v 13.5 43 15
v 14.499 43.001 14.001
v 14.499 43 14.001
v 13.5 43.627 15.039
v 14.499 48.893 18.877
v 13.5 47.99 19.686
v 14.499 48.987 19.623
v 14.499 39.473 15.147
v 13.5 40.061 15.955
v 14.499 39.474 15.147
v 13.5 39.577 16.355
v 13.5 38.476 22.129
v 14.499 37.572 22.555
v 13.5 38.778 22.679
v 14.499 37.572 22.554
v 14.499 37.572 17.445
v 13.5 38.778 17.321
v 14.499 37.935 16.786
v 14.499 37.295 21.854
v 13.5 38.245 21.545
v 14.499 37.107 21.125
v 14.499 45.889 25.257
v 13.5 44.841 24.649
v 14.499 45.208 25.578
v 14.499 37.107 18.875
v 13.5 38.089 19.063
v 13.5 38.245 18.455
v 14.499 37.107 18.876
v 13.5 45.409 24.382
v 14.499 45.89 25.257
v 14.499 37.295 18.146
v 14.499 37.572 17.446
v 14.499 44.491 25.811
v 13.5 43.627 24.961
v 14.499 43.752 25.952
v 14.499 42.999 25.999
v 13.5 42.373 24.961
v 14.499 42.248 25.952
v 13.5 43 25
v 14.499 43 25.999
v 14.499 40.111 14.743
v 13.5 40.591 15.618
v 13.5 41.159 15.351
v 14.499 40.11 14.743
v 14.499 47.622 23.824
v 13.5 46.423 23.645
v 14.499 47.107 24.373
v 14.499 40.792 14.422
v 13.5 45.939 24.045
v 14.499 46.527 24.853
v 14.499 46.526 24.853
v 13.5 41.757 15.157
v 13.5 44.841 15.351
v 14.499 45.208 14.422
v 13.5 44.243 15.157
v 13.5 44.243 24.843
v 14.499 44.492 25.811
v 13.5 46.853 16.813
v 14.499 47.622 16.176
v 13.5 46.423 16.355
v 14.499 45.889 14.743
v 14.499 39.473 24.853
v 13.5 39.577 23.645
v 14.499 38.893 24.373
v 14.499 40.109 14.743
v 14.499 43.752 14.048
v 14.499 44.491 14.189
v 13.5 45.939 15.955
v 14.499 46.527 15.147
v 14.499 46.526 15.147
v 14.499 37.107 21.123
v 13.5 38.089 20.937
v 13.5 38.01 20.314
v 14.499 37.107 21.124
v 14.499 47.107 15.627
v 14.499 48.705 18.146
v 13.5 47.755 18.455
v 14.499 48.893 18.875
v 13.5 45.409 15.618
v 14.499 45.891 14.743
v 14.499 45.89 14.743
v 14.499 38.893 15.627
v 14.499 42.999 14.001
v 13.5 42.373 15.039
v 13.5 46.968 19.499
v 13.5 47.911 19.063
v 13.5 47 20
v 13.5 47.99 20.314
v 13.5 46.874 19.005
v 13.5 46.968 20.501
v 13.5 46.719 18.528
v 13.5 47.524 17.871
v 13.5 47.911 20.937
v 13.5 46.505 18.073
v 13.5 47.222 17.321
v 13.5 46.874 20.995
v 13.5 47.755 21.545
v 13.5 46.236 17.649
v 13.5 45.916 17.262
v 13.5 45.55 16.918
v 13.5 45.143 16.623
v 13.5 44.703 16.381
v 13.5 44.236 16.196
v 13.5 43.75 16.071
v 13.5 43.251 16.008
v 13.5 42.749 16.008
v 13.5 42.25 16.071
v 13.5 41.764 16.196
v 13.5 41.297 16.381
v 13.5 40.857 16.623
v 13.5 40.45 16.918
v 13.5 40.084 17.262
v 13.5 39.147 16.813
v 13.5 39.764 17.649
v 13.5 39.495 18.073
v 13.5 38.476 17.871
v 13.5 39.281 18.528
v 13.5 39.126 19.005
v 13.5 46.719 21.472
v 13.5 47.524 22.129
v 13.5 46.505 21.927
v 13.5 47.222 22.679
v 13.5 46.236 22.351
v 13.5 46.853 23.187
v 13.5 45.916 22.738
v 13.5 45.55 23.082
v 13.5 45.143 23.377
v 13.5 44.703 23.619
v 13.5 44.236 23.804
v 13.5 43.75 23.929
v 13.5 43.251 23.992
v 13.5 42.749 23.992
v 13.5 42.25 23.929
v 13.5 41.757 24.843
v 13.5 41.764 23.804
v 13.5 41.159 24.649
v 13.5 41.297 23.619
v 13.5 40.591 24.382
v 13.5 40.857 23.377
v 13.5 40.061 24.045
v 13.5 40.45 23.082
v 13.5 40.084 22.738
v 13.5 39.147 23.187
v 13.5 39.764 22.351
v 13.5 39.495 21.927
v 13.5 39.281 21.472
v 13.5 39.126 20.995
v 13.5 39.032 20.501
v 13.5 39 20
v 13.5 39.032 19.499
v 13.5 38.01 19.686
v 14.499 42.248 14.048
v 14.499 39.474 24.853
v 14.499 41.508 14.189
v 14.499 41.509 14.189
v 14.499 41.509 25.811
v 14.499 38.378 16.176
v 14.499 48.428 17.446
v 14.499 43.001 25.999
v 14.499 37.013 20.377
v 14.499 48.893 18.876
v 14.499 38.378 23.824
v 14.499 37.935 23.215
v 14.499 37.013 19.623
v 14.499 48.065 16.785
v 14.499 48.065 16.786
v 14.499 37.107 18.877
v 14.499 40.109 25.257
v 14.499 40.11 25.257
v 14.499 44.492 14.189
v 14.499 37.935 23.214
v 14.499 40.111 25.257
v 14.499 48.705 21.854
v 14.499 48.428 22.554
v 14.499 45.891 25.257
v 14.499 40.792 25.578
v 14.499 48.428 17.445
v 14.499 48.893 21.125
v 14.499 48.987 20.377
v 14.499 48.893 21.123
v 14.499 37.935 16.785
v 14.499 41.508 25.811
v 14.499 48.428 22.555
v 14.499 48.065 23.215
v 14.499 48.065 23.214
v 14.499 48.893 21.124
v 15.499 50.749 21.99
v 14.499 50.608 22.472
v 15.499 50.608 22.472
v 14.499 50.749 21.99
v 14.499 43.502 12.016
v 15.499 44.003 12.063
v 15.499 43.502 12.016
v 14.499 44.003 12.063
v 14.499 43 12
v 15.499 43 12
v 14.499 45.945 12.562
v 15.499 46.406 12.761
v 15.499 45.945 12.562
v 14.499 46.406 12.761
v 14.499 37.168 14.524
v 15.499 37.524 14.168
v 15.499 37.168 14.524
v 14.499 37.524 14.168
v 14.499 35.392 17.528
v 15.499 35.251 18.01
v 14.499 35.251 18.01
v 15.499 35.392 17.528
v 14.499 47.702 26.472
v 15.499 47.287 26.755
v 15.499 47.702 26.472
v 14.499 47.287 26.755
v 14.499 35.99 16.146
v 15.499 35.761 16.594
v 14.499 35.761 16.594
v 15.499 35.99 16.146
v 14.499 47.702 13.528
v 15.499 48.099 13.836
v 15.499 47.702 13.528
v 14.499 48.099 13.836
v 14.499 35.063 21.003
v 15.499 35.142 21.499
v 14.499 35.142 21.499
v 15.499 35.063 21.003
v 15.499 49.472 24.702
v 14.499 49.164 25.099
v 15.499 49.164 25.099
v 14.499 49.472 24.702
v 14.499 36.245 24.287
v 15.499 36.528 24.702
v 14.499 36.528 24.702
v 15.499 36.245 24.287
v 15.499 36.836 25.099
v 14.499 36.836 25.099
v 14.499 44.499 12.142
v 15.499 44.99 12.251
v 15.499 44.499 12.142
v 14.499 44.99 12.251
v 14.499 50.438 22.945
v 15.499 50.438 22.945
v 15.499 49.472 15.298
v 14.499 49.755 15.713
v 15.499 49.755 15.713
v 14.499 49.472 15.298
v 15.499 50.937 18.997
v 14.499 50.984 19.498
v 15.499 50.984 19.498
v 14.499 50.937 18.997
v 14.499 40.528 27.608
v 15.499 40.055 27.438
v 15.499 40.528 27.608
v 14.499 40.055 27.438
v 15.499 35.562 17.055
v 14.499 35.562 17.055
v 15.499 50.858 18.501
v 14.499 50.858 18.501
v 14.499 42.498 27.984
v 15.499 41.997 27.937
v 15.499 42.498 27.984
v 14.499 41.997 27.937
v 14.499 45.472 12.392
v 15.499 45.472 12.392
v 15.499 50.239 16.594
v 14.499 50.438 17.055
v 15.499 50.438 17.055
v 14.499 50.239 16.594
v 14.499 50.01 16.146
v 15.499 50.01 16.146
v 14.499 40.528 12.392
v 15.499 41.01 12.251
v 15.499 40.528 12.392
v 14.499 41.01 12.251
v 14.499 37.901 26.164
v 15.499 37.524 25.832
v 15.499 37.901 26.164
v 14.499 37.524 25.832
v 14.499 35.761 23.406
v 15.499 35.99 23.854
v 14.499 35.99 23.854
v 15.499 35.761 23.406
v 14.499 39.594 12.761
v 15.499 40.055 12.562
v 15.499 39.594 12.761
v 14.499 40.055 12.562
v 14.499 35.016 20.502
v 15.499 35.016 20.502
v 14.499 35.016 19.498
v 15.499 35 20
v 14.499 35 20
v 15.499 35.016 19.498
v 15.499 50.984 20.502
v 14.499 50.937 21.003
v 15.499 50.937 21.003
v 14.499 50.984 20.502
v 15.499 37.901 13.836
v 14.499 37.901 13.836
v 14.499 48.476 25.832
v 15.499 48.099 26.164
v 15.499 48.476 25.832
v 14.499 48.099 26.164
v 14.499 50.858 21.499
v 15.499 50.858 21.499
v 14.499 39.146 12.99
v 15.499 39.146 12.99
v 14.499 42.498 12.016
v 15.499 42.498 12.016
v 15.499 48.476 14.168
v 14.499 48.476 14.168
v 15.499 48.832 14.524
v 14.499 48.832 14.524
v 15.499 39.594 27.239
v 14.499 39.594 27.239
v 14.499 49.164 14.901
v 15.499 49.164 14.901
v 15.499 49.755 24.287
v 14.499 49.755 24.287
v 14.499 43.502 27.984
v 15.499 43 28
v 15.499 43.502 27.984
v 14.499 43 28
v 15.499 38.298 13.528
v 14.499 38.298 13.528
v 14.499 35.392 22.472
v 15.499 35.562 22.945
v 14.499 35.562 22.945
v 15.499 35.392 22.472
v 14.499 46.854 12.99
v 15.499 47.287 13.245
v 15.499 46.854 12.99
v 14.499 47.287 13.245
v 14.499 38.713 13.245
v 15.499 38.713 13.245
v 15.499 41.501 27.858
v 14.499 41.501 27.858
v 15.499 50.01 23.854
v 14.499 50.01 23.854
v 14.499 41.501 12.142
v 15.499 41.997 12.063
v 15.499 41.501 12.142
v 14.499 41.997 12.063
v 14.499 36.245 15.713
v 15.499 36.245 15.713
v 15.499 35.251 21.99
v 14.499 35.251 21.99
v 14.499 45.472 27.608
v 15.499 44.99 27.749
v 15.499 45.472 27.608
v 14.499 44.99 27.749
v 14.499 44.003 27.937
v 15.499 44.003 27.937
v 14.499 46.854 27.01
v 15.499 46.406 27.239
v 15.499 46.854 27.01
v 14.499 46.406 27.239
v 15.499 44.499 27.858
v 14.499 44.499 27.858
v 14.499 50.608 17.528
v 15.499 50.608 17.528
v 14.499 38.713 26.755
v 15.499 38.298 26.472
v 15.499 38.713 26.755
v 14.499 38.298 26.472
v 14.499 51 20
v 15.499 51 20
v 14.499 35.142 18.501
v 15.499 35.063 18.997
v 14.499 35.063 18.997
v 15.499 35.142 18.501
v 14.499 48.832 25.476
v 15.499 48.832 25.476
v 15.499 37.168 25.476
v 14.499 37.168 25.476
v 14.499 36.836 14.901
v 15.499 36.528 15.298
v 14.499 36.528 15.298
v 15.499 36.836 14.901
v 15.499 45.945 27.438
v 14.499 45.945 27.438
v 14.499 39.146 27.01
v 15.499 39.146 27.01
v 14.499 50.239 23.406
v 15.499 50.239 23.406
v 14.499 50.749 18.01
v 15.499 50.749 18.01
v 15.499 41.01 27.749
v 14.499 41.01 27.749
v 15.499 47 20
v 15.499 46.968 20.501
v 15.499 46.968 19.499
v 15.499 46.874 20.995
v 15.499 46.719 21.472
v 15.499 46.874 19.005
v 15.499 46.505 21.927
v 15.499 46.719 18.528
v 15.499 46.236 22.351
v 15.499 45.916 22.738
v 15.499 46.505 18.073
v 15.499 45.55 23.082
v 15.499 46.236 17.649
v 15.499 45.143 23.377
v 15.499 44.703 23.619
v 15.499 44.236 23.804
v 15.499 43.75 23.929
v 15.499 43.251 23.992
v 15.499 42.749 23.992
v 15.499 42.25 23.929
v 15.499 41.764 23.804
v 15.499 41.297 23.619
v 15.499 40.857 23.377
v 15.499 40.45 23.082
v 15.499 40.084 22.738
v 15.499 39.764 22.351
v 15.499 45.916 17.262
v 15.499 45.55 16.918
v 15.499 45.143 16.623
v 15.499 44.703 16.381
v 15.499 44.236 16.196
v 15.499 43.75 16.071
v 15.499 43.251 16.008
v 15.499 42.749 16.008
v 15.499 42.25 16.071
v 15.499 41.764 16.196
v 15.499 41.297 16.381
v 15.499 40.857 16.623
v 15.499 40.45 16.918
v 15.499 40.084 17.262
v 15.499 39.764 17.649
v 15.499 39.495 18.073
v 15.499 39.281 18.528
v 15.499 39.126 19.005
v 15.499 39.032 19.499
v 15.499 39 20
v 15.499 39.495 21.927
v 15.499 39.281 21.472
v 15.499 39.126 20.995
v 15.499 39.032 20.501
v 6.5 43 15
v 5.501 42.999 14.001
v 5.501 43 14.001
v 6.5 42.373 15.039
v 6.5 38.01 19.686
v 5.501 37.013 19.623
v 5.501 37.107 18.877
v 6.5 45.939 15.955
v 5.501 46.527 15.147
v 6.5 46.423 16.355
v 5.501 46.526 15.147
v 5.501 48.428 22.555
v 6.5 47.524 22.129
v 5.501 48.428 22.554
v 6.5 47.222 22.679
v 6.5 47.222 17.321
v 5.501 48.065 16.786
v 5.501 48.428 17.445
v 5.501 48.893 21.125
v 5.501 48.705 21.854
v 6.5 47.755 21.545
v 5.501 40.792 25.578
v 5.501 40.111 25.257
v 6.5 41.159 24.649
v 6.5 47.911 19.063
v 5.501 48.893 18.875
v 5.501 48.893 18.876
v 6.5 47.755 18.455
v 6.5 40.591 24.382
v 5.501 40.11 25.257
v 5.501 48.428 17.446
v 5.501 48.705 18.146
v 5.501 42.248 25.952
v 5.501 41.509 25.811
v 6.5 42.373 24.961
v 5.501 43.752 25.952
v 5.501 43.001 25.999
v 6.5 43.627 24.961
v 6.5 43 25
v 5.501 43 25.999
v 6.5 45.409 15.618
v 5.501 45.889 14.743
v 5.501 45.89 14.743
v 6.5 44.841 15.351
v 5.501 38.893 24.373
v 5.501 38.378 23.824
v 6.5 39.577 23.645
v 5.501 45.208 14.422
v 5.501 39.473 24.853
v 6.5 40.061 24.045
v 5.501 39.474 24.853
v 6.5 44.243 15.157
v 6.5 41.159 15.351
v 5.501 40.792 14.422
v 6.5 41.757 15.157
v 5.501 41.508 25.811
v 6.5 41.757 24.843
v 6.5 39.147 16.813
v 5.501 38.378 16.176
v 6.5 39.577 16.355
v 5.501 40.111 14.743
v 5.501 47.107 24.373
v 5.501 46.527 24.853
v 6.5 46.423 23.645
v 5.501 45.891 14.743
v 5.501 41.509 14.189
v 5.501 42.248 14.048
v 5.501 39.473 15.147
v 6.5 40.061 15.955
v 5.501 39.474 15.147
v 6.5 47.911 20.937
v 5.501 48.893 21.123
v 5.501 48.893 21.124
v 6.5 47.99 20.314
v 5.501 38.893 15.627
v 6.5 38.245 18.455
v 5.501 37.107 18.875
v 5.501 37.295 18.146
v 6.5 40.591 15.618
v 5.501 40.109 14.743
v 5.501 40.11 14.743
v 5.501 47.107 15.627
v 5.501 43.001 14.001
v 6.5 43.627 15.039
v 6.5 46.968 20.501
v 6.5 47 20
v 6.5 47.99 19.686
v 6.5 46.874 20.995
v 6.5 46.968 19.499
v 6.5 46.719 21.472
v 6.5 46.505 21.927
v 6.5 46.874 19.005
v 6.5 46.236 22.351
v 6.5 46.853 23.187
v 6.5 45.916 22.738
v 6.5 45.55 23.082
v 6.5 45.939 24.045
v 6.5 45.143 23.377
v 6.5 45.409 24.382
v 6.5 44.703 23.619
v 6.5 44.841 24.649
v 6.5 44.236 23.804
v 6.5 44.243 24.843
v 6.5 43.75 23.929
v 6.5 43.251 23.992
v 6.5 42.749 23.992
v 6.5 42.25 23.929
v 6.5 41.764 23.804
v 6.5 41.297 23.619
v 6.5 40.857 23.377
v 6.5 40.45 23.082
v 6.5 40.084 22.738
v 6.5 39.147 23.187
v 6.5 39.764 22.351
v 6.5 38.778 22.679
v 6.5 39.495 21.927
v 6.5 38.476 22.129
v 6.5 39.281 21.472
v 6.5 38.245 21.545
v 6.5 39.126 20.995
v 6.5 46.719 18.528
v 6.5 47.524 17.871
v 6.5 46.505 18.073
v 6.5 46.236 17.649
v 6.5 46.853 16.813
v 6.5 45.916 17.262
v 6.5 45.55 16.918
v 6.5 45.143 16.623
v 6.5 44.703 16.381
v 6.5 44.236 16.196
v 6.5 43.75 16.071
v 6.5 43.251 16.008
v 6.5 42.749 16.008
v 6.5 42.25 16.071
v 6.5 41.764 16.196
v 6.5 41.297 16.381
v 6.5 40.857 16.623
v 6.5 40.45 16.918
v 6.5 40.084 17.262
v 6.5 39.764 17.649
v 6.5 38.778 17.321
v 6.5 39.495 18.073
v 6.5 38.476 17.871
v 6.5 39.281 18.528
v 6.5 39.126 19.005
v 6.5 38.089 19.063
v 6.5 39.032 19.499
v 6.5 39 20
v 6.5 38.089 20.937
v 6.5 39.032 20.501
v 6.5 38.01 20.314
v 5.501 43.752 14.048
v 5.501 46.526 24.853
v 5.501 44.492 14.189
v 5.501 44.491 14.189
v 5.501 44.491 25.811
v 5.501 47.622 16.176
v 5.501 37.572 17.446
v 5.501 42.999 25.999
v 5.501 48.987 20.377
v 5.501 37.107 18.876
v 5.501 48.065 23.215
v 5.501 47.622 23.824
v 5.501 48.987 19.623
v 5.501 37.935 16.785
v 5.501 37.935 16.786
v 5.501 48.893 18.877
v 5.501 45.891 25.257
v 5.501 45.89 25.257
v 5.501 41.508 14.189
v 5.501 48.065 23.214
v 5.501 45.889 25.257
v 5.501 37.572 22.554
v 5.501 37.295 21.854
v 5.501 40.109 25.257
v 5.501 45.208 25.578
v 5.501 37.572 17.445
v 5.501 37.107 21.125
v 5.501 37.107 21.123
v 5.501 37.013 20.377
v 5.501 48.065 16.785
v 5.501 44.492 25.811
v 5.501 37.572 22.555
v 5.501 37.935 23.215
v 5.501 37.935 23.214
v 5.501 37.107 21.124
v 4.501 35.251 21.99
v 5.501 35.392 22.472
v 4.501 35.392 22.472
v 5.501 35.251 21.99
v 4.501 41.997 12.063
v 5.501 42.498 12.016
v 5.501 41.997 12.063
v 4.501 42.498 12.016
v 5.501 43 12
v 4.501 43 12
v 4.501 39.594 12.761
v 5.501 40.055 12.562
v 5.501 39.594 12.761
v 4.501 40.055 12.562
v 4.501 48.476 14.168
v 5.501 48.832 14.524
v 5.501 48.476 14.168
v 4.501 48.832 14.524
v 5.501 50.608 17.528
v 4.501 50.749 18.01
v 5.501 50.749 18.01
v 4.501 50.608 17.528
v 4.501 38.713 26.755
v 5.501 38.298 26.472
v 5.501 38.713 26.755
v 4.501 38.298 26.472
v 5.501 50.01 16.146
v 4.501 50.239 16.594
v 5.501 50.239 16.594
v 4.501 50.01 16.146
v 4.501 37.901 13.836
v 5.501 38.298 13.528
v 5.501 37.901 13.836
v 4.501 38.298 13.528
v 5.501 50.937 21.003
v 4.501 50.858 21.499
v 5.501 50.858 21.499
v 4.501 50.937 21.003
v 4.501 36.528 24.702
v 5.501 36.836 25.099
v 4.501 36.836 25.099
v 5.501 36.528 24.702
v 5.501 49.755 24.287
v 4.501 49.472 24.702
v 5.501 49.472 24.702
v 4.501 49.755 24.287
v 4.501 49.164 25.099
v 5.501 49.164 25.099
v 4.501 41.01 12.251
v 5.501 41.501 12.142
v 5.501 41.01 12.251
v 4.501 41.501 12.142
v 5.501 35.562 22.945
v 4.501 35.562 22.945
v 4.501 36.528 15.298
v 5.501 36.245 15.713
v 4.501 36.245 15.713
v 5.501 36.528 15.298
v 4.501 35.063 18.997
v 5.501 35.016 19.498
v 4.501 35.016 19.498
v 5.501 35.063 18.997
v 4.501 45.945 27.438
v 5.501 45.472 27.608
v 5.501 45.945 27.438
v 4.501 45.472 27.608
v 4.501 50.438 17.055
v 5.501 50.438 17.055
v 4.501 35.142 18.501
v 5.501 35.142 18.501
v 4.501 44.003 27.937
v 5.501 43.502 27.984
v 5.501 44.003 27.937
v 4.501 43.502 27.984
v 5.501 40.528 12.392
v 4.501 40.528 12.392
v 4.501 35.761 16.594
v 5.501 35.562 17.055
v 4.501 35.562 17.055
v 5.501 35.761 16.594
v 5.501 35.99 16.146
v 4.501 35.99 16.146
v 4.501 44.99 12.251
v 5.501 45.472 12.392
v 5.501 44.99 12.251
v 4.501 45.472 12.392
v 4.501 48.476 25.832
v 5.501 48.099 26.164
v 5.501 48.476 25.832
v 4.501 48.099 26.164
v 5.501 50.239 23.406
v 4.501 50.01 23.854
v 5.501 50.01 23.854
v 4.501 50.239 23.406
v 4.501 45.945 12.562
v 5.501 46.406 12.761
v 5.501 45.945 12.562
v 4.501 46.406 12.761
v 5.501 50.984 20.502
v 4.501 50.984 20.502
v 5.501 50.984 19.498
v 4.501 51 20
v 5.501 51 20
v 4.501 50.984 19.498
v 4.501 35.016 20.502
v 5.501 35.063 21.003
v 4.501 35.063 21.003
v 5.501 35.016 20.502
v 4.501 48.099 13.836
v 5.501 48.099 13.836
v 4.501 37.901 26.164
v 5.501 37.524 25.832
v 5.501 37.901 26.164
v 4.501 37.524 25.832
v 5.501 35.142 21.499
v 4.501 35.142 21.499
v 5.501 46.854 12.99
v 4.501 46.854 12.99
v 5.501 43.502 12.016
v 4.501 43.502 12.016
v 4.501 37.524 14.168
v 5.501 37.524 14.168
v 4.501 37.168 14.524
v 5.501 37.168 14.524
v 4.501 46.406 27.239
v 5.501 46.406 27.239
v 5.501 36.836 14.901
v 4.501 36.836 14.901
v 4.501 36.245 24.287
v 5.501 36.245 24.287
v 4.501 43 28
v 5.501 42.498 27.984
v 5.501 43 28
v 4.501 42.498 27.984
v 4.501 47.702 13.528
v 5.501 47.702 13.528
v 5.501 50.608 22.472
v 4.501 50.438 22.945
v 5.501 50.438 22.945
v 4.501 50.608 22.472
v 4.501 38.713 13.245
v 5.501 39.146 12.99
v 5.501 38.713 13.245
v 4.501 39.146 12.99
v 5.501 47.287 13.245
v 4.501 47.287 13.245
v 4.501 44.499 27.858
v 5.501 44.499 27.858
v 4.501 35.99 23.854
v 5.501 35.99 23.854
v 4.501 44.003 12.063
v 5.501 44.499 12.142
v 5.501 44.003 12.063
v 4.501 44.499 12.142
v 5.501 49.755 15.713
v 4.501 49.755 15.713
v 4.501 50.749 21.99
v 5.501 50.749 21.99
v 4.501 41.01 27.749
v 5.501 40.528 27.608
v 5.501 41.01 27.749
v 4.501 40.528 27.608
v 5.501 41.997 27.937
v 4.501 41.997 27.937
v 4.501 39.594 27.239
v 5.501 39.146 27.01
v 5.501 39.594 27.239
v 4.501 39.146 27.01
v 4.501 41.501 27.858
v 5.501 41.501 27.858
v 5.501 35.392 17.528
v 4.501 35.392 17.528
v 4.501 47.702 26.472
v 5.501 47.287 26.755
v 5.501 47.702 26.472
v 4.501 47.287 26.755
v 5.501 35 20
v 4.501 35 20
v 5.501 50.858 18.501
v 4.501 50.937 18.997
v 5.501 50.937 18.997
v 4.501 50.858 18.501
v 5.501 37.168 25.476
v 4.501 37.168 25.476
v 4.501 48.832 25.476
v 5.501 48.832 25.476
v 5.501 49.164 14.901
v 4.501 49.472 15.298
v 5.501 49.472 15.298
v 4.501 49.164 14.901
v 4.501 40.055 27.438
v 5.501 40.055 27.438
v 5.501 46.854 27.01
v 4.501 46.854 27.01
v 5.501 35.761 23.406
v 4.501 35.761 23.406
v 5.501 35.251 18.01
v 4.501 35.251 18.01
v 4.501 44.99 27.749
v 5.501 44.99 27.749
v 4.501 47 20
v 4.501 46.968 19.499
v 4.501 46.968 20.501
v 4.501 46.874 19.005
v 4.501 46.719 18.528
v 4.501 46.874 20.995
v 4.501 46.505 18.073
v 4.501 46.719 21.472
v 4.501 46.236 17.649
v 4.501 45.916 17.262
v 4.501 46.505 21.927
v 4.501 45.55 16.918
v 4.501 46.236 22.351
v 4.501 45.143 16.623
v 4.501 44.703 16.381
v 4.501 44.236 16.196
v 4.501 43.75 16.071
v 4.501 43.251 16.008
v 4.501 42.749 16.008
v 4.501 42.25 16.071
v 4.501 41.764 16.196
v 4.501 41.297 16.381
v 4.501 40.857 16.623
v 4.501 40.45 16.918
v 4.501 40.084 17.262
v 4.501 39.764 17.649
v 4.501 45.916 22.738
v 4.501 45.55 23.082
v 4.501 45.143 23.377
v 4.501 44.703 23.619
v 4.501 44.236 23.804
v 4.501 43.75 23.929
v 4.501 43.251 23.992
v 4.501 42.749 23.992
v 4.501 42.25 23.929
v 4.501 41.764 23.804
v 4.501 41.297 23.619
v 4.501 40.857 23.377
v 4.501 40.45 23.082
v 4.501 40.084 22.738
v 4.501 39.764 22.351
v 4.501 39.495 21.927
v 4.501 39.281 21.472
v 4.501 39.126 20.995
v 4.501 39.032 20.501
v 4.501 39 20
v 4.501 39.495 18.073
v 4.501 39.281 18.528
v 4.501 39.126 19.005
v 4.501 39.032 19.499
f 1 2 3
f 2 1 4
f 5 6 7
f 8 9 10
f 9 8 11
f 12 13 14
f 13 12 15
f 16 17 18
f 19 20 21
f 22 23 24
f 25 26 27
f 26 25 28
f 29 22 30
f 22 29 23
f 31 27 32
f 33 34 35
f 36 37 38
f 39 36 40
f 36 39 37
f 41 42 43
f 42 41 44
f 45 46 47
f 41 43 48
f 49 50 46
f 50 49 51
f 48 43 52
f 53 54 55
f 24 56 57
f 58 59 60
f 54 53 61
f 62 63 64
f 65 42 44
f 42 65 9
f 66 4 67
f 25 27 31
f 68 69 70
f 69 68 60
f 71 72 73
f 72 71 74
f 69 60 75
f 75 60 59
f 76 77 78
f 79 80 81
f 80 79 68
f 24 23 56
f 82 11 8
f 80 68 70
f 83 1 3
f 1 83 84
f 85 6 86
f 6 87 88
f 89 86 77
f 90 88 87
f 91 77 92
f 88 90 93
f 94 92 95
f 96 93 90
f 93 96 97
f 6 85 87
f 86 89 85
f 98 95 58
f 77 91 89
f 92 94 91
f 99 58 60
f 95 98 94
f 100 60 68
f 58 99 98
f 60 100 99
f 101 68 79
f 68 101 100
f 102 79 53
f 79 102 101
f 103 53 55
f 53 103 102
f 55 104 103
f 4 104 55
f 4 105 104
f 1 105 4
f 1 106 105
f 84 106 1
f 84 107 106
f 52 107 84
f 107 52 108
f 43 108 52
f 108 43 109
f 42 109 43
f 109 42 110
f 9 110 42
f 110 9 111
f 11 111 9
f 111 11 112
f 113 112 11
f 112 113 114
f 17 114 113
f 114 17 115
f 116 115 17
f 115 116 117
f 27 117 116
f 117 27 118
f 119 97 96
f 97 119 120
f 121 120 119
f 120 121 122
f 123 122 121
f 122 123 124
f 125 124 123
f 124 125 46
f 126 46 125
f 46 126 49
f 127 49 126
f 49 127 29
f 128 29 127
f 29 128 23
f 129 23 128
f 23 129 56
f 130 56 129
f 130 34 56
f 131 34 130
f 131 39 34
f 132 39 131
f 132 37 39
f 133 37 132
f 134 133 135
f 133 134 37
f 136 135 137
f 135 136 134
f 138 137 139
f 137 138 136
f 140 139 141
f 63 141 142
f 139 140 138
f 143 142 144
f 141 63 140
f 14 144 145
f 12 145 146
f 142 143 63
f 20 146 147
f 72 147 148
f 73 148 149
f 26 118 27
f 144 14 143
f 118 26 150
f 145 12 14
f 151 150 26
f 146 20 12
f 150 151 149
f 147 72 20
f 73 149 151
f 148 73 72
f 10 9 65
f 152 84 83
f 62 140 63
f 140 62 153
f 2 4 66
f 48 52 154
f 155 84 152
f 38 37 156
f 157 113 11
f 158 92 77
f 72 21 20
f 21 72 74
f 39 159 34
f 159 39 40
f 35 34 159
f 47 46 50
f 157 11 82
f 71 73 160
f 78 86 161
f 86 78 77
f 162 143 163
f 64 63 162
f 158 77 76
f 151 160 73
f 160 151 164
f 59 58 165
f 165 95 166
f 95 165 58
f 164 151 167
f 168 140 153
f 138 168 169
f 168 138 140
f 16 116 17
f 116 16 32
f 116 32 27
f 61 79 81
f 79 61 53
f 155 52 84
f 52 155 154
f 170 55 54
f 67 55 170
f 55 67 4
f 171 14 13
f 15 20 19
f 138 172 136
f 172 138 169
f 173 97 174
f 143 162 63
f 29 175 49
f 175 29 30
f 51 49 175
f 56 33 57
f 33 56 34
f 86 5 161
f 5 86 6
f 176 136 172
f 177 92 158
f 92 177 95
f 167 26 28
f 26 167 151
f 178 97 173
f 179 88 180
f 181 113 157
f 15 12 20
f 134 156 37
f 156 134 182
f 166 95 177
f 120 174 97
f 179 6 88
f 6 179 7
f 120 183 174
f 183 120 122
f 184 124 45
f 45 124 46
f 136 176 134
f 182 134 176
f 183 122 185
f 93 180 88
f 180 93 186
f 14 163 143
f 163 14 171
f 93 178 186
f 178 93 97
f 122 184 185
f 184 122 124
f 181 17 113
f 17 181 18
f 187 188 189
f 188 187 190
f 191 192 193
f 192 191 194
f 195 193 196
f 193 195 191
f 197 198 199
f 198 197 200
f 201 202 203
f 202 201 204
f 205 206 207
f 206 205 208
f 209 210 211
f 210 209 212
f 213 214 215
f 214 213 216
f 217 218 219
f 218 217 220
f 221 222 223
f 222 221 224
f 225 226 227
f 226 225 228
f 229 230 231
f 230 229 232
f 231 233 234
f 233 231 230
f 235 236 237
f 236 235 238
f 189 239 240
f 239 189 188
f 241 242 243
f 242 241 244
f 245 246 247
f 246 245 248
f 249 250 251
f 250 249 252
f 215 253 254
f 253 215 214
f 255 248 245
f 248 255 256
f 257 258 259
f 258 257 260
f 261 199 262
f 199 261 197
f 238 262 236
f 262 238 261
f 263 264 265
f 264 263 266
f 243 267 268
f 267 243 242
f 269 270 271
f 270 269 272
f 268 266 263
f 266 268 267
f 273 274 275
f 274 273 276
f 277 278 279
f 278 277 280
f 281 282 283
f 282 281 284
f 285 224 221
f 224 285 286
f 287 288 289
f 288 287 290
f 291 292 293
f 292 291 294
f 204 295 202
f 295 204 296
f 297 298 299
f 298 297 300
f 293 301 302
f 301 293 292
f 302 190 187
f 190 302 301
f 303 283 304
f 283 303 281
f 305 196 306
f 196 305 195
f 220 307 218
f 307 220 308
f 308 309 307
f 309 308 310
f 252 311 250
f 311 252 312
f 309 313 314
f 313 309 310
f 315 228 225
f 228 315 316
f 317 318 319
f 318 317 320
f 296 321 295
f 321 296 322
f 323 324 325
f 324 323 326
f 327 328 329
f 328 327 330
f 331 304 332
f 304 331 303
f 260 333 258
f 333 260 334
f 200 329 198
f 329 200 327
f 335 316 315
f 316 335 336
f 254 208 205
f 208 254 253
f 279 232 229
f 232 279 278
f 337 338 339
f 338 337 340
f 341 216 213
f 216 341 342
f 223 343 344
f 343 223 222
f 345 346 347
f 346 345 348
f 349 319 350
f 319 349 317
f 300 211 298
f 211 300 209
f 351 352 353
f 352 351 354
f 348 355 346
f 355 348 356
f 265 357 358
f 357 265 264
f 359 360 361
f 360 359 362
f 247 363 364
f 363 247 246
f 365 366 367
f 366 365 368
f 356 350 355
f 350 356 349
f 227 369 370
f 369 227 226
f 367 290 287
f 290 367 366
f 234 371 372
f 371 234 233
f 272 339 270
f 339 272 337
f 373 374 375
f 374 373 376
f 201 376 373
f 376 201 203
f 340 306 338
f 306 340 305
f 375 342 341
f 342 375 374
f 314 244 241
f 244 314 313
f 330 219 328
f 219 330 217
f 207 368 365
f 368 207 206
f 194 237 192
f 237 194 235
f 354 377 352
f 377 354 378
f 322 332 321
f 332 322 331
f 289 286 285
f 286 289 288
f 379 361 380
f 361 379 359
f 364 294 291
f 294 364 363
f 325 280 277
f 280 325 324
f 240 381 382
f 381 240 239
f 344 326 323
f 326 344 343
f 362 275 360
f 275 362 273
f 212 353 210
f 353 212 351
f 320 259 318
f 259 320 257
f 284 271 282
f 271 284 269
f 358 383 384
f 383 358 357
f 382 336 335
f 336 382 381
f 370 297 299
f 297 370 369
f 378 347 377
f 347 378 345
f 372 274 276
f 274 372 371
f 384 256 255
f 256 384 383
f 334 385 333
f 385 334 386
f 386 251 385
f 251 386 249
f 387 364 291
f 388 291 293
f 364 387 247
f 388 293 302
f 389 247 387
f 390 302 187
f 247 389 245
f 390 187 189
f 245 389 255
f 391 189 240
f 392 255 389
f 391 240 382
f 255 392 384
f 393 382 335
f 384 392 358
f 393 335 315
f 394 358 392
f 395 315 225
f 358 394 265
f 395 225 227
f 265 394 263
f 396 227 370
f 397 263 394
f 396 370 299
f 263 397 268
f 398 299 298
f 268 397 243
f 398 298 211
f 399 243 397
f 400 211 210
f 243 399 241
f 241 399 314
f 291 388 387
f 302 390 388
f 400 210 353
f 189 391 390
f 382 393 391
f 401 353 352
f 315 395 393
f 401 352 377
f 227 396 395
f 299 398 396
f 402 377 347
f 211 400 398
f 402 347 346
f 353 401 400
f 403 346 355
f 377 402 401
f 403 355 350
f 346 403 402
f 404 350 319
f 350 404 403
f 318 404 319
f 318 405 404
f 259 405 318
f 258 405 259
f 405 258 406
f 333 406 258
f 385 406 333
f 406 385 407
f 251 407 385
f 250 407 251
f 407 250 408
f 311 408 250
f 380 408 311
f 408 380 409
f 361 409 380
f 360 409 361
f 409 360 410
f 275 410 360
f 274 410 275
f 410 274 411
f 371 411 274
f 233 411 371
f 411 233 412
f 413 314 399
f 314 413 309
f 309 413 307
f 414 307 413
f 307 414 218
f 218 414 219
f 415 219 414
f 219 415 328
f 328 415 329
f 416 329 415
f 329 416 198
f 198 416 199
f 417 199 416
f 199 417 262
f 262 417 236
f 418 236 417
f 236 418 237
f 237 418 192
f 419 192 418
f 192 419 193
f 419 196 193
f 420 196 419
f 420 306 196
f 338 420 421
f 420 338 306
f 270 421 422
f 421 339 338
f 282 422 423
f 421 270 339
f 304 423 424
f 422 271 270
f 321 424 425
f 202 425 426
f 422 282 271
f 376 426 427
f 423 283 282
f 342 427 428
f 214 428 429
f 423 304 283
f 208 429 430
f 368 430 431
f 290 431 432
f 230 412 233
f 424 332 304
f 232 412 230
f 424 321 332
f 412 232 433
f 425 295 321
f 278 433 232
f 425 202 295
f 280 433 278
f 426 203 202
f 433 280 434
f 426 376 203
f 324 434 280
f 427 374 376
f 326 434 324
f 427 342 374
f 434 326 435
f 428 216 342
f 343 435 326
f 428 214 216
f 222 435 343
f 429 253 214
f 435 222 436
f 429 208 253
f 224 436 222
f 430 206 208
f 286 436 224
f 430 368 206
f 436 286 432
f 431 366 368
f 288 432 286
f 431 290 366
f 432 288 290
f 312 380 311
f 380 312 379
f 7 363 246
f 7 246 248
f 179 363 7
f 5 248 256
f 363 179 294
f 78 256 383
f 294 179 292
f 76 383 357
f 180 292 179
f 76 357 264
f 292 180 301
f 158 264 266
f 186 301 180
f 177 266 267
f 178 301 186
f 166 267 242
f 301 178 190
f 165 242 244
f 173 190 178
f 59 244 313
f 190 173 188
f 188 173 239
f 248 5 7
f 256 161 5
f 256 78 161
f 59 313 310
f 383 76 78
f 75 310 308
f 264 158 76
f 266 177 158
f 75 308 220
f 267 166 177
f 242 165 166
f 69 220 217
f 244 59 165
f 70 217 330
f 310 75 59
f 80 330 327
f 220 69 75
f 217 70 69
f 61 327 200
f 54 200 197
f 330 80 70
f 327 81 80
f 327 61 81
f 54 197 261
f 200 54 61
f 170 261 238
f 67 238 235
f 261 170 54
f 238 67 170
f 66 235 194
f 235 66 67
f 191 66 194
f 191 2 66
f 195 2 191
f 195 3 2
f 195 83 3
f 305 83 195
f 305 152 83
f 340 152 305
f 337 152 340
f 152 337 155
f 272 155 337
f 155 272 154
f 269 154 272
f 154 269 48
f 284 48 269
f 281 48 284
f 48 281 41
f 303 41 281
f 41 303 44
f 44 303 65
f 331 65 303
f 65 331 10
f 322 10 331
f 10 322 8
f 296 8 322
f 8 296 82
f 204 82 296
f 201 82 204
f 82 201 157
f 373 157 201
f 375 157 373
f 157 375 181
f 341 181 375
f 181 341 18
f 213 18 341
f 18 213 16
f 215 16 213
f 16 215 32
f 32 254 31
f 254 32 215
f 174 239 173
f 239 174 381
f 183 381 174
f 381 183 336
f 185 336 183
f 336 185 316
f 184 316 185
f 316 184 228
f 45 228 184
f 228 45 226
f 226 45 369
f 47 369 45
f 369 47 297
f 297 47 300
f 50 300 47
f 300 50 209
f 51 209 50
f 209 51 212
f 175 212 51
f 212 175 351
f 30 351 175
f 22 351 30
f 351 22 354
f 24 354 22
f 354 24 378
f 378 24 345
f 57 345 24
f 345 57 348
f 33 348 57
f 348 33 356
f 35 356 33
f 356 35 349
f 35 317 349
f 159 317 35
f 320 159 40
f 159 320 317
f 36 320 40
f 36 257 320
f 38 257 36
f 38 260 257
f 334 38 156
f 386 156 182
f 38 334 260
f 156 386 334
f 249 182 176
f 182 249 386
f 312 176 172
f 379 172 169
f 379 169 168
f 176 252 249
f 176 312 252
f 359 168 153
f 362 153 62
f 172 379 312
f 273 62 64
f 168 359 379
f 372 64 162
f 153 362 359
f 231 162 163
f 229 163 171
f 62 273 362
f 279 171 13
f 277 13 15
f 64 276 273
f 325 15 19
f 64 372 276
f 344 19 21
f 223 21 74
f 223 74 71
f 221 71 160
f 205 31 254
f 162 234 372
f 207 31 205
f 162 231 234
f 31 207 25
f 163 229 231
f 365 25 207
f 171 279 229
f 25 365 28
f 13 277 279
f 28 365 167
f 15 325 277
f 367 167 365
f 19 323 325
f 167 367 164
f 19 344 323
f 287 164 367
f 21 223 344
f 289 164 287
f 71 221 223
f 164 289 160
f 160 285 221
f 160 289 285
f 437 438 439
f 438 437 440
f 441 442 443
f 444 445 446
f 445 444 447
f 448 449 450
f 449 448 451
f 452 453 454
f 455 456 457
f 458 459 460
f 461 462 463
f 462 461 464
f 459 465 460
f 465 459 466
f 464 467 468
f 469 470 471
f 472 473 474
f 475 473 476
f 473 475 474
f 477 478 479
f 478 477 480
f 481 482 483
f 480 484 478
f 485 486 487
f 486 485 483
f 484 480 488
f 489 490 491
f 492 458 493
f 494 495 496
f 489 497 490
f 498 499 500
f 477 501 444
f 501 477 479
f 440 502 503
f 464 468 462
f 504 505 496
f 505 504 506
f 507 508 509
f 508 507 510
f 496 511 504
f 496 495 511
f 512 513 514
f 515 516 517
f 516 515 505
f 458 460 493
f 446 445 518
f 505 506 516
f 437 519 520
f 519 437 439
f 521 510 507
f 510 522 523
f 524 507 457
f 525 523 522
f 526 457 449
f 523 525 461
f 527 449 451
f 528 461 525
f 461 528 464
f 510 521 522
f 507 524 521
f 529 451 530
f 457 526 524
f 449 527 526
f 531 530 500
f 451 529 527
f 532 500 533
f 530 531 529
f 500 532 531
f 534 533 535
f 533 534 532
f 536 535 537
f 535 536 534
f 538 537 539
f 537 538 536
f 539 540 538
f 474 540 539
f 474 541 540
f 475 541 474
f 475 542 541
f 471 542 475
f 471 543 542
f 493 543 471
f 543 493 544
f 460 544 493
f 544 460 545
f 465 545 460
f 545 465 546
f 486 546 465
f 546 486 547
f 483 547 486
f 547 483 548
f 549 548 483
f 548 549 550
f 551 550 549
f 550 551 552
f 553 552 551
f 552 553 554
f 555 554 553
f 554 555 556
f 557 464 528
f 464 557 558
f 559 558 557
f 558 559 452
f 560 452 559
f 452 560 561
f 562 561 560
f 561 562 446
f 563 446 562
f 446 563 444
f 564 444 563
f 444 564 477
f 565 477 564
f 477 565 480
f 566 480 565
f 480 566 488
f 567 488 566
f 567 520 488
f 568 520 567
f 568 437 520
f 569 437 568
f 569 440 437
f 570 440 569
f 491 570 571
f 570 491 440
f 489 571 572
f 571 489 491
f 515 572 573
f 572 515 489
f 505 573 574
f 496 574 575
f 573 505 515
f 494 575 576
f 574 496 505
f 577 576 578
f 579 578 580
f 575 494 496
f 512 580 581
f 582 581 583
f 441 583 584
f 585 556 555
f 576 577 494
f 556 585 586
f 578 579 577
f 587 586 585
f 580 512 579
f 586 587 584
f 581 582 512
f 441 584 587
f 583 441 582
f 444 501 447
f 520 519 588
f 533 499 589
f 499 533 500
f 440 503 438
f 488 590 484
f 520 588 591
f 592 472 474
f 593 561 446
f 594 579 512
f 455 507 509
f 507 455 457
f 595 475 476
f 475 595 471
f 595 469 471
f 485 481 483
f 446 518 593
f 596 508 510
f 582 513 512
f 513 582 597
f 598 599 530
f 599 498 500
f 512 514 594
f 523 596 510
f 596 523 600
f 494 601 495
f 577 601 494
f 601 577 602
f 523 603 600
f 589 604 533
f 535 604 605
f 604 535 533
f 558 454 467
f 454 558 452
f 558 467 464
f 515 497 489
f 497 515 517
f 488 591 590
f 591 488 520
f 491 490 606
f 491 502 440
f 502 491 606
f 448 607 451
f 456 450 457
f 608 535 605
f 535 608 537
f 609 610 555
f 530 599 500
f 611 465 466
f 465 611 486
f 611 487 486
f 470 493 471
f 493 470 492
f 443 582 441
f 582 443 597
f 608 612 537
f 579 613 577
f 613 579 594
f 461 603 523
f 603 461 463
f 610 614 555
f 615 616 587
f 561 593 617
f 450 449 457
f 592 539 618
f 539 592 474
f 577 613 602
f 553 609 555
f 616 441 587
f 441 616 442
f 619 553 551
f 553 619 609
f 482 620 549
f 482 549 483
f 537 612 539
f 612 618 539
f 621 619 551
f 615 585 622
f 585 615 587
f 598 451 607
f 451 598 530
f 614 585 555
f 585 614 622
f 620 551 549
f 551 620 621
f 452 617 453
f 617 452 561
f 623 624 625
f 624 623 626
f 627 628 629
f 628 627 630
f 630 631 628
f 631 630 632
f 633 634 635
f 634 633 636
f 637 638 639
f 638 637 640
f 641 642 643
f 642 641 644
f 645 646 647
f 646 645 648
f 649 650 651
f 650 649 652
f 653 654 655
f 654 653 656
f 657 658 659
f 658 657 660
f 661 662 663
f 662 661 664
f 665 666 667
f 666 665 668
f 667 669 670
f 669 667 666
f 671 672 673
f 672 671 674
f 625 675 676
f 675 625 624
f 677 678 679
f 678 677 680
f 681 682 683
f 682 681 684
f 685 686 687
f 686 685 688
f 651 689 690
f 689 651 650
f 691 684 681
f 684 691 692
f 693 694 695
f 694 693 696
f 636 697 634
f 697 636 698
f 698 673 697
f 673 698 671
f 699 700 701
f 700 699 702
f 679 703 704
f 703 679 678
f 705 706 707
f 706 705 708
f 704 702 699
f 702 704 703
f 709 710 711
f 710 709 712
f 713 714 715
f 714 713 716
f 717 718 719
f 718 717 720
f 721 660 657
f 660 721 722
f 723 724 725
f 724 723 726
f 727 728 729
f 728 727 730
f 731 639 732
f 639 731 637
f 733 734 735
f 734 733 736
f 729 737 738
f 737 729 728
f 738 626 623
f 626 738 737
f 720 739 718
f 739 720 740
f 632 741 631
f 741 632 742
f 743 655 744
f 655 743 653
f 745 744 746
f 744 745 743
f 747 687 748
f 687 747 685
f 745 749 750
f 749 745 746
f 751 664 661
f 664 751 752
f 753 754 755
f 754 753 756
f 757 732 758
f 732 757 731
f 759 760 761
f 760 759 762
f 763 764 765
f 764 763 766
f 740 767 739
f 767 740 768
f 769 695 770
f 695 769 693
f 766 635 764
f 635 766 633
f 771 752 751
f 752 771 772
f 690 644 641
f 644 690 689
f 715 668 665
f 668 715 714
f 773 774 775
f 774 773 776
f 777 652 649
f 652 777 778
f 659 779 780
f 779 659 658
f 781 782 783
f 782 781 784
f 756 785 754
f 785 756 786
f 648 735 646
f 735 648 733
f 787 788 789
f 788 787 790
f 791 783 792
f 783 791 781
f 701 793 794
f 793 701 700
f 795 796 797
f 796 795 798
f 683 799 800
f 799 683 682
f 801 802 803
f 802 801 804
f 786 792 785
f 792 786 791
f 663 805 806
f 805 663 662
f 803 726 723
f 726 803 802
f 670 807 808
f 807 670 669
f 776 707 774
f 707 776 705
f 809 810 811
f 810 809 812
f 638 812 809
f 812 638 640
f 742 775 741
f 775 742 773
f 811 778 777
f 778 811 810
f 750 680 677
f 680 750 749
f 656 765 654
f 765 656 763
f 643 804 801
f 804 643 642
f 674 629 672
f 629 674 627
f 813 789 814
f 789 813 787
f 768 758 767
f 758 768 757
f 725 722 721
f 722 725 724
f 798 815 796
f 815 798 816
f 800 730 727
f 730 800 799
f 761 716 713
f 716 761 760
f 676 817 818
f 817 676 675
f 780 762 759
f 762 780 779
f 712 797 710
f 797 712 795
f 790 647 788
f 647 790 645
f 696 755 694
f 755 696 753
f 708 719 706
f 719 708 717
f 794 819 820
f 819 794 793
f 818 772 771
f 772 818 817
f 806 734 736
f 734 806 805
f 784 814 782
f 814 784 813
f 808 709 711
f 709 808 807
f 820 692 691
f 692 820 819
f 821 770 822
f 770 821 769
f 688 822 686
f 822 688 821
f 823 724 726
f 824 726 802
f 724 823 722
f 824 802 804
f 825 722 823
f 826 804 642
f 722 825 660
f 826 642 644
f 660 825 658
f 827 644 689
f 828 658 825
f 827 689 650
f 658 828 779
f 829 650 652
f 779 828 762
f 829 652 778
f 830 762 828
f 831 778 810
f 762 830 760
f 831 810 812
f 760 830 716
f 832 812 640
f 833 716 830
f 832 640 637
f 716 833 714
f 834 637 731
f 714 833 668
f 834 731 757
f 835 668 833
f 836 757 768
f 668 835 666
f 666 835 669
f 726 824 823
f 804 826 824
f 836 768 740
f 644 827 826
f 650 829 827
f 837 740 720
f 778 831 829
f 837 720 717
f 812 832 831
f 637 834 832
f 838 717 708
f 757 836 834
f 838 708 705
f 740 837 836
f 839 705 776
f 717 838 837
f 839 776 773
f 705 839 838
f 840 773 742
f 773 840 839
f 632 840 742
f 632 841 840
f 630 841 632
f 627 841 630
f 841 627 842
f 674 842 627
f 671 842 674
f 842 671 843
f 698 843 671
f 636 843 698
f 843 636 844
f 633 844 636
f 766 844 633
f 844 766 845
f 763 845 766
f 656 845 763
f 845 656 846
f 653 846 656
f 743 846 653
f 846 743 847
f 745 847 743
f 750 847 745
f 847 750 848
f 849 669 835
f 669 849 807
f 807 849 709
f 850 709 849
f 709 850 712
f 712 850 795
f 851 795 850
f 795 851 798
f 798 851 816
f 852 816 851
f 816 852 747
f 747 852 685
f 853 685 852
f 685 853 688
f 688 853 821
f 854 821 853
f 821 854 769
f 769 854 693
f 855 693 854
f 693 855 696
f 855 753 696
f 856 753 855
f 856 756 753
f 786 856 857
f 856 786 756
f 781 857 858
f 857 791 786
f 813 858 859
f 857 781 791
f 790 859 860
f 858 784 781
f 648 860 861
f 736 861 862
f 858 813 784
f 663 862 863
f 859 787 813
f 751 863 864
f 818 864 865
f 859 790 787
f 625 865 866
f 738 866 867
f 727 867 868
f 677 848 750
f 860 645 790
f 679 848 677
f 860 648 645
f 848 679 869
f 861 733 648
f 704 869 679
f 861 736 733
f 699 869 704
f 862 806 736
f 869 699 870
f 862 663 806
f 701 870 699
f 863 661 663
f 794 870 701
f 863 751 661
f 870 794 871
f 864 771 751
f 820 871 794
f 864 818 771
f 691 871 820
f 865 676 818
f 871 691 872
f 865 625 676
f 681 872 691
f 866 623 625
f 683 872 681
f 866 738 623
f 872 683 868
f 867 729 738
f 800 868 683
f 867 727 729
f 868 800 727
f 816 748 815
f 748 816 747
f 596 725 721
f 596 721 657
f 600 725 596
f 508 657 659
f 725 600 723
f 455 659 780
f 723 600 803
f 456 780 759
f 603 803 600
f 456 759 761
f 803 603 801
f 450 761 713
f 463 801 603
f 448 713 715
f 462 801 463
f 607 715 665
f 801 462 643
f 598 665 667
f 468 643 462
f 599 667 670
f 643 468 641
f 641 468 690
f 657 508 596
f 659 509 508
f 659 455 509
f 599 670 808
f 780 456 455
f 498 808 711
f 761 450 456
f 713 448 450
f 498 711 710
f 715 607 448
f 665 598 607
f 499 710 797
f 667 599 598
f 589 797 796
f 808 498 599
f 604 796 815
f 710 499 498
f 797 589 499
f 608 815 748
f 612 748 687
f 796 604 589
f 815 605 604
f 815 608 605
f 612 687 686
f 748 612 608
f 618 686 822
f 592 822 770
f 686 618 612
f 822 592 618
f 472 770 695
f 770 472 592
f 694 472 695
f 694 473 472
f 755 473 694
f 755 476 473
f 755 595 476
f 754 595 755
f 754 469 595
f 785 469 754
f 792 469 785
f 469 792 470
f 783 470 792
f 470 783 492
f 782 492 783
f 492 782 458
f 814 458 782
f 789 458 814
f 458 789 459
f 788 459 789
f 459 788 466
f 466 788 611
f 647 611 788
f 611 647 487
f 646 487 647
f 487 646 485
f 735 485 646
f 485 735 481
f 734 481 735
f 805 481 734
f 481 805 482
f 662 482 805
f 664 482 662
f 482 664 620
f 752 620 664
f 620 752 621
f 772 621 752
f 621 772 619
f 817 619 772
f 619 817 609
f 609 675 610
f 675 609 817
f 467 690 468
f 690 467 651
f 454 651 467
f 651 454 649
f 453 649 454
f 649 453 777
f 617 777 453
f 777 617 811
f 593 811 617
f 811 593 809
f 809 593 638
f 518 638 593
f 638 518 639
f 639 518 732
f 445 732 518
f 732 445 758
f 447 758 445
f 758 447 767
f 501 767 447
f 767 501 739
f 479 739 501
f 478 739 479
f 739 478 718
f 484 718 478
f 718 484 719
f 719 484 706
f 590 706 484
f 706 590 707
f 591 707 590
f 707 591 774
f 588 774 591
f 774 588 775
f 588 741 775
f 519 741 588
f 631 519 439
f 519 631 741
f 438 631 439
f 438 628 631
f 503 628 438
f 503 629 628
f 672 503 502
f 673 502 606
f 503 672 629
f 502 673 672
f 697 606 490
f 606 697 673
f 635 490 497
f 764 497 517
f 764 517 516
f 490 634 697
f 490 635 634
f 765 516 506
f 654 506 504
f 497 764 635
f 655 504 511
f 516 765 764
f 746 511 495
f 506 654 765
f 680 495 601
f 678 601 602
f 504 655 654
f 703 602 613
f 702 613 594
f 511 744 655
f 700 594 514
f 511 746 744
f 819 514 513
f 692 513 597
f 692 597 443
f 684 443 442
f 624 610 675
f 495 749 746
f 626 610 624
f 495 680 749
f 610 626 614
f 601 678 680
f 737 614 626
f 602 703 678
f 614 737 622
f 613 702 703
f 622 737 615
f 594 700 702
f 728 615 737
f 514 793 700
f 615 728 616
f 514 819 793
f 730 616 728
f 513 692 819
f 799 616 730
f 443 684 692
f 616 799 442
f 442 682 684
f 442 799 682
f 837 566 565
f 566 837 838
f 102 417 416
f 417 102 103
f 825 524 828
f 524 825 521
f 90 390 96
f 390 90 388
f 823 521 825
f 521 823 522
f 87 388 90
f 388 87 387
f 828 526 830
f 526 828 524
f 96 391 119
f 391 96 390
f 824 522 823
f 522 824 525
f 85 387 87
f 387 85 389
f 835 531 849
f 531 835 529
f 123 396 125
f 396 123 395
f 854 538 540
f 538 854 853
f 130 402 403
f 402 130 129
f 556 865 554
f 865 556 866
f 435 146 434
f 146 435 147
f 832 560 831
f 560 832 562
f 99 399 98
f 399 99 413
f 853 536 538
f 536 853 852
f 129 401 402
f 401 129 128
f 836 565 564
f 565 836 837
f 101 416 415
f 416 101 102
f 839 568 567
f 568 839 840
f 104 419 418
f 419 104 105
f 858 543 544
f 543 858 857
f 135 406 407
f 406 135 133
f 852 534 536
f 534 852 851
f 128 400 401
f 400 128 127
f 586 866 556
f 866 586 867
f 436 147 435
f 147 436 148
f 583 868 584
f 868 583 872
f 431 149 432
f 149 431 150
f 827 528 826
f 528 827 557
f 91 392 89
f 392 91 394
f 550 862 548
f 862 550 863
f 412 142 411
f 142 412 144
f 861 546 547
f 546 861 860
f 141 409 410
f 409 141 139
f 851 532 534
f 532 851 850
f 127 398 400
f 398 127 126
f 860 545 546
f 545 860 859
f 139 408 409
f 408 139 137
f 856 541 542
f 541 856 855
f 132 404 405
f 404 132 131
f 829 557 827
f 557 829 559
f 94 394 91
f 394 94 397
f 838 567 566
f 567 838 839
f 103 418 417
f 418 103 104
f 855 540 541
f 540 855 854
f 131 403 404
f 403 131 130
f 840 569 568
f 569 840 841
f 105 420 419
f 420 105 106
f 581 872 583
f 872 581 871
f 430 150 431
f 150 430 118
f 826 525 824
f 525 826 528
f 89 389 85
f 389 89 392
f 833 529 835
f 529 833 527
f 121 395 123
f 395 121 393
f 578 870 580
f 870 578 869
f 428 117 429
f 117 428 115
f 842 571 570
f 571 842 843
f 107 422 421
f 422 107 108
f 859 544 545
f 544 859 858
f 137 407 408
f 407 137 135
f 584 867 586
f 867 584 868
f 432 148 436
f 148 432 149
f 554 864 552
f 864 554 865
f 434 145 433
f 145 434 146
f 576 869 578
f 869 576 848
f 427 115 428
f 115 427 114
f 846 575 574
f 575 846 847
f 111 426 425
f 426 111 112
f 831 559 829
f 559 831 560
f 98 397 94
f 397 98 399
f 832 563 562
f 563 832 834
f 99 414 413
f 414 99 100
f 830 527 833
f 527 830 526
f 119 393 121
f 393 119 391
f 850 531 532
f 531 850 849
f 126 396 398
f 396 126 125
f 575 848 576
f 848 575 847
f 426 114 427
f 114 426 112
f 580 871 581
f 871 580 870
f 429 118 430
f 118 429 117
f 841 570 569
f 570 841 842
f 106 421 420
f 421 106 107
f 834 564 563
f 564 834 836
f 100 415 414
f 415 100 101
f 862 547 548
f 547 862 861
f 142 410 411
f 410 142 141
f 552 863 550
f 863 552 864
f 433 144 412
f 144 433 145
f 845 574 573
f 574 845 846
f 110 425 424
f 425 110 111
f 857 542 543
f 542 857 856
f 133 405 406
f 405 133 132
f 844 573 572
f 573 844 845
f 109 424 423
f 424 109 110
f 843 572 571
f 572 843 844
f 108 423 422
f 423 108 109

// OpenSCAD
/*
Projet ReprapJeanne

Fixation basse des axes de l'imprimante

github: https://github.com/gnieark/reprapJeanne
wiki https://mail.jeannedhack.org/wicked/display.php?page=reprap_geante

By Gnieark https://blog-du-grouik.tinad.fr
& TranKILLoman   

License GNU-GPL V3

*/

linear_extrude (height=4.01)
	import (file="all.dxf", layer="foot-profil-0-4", $fn=100);

difference(){
	union(){
		translate([0,0,4])
			linear_extrude (height=36)
				import (file="all.dxf", layer="foot-profil-4-40", $fn=100);
		translate([13.5,43,20])
			rotate([0,90,0])
				unCone();
		translate([6.5,43,20])
			rotate([180,90,0])
				unCone();
	}
	translate([0,43,20])
		rotate([90,0,90])
			cylinder(r=4,$fn=50, h=20);
}

module unCone(){
	cylinder (r1=5, r2=6, h=1, $fn=50);
 	translate([0,0,0.999]) cylinder (r=8, h=1, $fn=100);
}
